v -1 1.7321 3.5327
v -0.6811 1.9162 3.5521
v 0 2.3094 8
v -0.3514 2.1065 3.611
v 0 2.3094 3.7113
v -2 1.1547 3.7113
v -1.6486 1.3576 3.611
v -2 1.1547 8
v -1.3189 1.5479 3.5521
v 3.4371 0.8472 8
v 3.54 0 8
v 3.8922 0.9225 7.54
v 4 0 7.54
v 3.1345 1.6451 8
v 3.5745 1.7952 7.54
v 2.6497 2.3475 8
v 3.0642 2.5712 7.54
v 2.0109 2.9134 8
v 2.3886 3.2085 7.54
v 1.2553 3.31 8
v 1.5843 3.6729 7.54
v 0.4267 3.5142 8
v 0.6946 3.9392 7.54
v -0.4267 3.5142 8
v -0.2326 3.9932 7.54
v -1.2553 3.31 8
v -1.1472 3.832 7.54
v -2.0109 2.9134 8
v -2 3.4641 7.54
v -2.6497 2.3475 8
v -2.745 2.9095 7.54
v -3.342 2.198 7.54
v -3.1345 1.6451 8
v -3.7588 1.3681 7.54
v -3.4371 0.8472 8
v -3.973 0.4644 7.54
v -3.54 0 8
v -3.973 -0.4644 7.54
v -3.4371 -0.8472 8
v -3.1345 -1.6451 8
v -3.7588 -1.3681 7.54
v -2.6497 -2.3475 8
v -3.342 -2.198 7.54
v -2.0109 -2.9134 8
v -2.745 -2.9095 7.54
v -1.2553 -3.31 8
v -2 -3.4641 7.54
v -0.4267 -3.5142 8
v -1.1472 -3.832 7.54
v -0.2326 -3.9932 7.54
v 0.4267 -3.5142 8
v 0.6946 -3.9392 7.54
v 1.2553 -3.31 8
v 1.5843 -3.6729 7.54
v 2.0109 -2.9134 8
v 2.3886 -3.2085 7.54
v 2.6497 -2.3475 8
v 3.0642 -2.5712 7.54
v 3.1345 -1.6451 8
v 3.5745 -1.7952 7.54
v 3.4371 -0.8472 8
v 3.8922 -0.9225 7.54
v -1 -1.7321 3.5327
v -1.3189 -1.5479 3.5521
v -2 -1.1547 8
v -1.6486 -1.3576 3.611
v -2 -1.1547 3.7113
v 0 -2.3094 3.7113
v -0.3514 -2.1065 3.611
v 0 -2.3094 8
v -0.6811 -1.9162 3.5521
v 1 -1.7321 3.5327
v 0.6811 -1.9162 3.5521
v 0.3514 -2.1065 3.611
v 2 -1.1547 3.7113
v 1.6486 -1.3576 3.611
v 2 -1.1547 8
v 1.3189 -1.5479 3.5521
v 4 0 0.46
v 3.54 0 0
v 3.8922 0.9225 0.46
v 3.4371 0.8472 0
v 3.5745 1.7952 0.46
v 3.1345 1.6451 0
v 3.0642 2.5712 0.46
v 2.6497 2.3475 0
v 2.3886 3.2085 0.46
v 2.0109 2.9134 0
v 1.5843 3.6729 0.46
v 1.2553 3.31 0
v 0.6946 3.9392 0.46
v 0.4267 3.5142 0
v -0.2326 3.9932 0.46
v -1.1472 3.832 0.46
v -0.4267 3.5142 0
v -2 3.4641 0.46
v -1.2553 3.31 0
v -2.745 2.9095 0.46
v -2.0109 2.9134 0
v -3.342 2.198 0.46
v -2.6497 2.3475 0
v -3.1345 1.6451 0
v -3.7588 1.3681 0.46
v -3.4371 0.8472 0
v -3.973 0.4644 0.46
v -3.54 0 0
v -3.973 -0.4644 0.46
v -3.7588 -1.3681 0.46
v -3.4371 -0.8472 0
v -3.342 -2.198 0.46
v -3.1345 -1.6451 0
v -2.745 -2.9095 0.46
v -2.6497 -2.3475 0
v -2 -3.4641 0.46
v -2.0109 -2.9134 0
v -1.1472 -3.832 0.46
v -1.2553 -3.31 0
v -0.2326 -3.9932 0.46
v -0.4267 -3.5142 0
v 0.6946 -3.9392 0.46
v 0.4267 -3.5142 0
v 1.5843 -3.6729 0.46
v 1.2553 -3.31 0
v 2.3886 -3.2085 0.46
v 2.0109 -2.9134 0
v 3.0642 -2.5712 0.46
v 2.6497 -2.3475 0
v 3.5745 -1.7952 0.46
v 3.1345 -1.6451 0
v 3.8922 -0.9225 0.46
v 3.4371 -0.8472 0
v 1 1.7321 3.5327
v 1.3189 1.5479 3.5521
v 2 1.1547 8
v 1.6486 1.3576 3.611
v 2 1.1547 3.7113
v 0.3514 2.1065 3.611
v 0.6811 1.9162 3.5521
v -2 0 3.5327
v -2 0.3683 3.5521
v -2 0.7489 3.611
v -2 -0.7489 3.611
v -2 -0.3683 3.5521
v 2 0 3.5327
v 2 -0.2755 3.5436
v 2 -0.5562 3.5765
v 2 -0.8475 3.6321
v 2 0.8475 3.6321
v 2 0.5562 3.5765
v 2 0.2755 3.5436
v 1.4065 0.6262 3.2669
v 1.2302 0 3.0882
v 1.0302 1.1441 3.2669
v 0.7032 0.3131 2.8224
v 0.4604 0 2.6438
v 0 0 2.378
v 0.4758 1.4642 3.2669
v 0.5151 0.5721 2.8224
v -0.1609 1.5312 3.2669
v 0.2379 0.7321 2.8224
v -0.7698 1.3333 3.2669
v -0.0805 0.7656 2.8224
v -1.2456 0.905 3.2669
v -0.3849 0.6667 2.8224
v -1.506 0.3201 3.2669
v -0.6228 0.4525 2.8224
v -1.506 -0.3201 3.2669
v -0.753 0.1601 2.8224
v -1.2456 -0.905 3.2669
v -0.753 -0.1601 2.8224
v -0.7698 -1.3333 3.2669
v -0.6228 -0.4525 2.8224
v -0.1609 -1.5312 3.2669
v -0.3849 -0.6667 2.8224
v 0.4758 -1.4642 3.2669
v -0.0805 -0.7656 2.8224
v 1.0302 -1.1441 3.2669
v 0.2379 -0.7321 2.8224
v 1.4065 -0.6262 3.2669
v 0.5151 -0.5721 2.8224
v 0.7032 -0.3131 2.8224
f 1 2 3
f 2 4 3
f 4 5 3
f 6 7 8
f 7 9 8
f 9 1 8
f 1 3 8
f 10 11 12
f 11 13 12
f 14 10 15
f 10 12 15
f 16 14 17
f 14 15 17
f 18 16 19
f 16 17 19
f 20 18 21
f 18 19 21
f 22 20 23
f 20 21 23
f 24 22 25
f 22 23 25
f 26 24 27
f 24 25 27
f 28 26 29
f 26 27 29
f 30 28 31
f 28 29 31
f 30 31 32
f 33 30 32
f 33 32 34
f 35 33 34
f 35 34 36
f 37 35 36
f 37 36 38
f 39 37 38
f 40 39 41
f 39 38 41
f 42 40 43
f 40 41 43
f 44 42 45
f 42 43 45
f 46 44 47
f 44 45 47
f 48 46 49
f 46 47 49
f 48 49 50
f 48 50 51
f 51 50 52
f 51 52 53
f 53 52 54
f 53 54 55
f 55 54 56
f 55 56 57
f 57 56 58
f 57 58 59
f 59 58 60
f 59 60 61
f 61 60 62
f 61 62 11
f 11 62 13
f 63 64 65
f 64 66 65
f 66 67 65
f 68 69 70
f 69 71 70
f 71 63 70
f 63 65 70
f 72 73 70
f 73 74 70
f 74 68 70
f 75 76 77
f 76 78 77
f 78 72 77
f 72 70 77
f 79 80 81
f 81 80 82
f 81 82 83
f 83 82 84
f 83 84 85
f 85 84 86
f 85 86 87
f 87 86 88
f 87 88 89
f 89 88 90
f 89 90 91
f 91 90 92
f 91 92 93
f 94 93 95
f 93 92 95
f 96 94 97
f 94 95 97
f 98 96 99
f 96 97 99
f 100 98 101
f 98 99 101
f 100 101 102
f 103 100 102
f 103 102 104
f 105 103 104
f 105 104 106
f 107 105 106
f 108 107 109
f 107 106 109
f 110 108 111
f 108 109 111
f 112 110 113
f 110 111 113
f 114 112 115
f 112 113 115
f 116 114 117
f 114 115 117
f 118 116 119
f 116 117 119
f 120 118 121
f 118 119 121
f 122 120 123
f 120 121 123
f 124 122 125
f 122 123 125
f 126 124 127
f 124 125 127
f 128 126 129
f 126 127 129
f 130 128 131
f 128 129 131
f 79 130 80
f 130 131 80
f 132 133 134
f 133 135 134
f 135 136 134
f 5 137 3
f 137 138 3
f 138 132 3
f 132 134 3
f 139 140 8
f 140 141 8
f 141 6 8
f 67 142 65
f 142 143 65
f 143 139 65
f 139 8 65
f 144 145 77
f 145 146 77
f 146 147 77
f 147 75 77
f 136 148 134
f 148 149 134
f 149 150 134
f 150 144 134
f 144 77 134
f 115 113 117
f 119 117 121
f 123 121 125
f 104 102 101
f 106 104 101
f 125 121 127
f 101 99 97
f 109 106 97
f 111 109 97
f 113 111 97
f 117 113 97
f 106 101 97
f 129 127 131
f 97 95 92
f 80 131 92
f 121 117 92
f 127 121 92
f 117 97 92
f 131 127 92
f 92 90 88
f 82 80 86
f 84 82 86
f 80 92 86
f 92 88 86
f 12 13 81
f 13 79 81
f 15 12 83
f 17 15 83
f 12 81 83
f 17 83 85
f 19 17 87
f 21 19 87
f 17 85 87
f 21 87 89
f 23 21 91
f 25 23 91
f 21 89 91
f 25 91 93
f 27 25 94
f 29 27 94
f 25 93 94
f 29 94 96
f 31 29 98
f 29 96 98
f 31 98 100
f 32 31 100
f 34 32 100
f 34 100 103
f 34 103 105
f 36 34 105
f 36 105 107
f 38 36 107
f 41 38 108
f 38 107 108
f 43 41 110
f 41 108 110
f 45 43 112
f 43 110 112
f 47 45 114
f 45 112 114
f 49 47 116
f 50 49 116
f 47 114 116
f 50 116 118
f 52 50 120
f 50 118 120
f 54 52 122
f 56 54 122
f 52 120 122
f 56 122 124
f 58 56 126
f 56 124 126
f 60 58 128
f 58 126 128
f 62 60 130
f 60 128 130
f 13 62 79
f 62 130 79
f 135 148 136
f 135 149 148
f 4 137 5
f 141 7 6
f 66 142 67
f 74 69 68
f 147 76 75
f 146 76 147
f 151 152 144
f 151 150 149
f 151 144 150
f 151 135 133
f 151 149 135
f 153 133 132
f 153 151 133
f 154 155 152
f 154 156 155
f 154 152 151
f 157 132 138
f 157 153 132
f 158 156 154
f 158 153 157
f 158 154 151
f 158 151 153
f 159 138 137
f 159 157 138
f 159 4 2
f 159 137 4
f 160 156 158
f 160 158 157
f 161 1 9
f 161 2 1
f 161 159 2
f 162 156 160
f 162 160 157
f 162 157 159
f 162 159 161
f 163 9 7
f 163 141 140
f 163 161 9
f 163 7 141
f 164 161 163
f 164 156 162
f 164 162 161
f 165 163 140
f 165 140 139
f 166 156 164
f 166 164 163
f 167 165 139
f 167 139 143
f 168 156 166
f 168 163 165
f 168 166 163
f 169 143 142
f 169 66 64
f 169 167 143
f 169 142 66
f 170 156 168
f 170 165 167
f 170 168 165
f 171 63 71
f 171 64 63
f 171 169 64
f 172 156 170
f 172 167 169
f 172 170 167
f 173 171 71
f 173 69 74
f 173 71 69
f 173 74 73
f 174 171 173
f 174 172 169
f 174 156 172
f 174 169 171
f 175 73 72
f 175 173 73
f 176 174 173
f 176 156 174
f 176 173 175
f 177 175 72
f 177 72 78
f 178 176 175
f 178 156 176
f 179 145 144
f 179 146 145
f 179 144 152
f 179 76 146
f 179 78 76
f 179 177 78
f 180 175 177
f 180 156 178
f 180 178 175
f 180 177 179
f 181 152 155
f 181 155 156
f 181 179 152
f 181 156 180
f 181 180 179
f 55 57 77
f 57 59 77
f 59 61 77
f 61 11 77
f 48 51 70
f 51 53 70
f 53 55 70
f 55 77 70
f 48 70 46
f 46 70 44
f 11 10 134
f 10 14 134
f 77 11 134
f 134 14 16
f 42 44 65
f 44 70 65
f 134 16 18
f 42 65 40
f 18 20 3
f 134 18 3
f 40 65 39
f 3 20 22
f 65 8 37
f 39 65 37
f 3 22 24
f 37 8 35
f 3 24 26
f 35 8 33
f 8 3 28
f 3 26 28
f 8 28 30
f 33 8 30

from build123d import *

# Parameters (mm, degrees)
SZKIC3_R                    = 3.009401077
DODANIE_WYCI_GNI_CIE1_DEPTH = 6


with BuildPart() as part:
    # Szkic1 → Obrót1 (revolve)
    with BuildSketch(Plane(origin=(0, 0, 0), x_dir=(0, 0, -1), z_dir=(1, 0, 0)), mode=Mode.PRIVATE) as obr_t1_sk:
        Polygon((-8, 0), (-8, 3.54), (-7.54, 4), (-0.46, 4), (0, 3.54), (0, 0), align=None)
    revolve(obr_t1_sk.sketch.rotate(Axis((0, 0, 0), (0, 0, 1)), 270), axis=Axis((0, 0, 0), (0, 0, 1)))

    # Szkic2 → Wycięcie-obrót1 (revolve, cut)
    with BuildSketch(Plane(origin=(0, 0, 0), x_dir=(0, 0, -1), z_dir=(1, 0, 0)), mode=Mode.PRIVATE) as wyci_cie_obr_t1_sk:
        Polygon((-8, 0), (-8, 2.809401077), (-4, 2.809401077), (-2.377991532, 0), align=None)
    revolve(wyci_cie_obr_t1_sk.sketch.rotate(Axis((0, 0, 2.377991532), (0, 0, 1)), 270), axis=Axis((0, 0, 2.377991532), (0, 0, 1)), mode=Mode.SUBTRACT)

    # Szkic3 → Dodanie-wyciągnięcie1 (add)
    with BuildSketch(Plane.XY.offset(8)):
        Circle(SZKIC3_R)
        Polygon((-2, 1.154700538), (-2, -1.154700538), (0, -2.309401077), (2, -1.154700538), (2, 1.154700538), (0, 2.309401077), align=None, mode=Mode.SUBTRACT)
    extrude(amount=-DODANIE_WYCI_GNI_CIE1_DEPTH)


solid = part.part
